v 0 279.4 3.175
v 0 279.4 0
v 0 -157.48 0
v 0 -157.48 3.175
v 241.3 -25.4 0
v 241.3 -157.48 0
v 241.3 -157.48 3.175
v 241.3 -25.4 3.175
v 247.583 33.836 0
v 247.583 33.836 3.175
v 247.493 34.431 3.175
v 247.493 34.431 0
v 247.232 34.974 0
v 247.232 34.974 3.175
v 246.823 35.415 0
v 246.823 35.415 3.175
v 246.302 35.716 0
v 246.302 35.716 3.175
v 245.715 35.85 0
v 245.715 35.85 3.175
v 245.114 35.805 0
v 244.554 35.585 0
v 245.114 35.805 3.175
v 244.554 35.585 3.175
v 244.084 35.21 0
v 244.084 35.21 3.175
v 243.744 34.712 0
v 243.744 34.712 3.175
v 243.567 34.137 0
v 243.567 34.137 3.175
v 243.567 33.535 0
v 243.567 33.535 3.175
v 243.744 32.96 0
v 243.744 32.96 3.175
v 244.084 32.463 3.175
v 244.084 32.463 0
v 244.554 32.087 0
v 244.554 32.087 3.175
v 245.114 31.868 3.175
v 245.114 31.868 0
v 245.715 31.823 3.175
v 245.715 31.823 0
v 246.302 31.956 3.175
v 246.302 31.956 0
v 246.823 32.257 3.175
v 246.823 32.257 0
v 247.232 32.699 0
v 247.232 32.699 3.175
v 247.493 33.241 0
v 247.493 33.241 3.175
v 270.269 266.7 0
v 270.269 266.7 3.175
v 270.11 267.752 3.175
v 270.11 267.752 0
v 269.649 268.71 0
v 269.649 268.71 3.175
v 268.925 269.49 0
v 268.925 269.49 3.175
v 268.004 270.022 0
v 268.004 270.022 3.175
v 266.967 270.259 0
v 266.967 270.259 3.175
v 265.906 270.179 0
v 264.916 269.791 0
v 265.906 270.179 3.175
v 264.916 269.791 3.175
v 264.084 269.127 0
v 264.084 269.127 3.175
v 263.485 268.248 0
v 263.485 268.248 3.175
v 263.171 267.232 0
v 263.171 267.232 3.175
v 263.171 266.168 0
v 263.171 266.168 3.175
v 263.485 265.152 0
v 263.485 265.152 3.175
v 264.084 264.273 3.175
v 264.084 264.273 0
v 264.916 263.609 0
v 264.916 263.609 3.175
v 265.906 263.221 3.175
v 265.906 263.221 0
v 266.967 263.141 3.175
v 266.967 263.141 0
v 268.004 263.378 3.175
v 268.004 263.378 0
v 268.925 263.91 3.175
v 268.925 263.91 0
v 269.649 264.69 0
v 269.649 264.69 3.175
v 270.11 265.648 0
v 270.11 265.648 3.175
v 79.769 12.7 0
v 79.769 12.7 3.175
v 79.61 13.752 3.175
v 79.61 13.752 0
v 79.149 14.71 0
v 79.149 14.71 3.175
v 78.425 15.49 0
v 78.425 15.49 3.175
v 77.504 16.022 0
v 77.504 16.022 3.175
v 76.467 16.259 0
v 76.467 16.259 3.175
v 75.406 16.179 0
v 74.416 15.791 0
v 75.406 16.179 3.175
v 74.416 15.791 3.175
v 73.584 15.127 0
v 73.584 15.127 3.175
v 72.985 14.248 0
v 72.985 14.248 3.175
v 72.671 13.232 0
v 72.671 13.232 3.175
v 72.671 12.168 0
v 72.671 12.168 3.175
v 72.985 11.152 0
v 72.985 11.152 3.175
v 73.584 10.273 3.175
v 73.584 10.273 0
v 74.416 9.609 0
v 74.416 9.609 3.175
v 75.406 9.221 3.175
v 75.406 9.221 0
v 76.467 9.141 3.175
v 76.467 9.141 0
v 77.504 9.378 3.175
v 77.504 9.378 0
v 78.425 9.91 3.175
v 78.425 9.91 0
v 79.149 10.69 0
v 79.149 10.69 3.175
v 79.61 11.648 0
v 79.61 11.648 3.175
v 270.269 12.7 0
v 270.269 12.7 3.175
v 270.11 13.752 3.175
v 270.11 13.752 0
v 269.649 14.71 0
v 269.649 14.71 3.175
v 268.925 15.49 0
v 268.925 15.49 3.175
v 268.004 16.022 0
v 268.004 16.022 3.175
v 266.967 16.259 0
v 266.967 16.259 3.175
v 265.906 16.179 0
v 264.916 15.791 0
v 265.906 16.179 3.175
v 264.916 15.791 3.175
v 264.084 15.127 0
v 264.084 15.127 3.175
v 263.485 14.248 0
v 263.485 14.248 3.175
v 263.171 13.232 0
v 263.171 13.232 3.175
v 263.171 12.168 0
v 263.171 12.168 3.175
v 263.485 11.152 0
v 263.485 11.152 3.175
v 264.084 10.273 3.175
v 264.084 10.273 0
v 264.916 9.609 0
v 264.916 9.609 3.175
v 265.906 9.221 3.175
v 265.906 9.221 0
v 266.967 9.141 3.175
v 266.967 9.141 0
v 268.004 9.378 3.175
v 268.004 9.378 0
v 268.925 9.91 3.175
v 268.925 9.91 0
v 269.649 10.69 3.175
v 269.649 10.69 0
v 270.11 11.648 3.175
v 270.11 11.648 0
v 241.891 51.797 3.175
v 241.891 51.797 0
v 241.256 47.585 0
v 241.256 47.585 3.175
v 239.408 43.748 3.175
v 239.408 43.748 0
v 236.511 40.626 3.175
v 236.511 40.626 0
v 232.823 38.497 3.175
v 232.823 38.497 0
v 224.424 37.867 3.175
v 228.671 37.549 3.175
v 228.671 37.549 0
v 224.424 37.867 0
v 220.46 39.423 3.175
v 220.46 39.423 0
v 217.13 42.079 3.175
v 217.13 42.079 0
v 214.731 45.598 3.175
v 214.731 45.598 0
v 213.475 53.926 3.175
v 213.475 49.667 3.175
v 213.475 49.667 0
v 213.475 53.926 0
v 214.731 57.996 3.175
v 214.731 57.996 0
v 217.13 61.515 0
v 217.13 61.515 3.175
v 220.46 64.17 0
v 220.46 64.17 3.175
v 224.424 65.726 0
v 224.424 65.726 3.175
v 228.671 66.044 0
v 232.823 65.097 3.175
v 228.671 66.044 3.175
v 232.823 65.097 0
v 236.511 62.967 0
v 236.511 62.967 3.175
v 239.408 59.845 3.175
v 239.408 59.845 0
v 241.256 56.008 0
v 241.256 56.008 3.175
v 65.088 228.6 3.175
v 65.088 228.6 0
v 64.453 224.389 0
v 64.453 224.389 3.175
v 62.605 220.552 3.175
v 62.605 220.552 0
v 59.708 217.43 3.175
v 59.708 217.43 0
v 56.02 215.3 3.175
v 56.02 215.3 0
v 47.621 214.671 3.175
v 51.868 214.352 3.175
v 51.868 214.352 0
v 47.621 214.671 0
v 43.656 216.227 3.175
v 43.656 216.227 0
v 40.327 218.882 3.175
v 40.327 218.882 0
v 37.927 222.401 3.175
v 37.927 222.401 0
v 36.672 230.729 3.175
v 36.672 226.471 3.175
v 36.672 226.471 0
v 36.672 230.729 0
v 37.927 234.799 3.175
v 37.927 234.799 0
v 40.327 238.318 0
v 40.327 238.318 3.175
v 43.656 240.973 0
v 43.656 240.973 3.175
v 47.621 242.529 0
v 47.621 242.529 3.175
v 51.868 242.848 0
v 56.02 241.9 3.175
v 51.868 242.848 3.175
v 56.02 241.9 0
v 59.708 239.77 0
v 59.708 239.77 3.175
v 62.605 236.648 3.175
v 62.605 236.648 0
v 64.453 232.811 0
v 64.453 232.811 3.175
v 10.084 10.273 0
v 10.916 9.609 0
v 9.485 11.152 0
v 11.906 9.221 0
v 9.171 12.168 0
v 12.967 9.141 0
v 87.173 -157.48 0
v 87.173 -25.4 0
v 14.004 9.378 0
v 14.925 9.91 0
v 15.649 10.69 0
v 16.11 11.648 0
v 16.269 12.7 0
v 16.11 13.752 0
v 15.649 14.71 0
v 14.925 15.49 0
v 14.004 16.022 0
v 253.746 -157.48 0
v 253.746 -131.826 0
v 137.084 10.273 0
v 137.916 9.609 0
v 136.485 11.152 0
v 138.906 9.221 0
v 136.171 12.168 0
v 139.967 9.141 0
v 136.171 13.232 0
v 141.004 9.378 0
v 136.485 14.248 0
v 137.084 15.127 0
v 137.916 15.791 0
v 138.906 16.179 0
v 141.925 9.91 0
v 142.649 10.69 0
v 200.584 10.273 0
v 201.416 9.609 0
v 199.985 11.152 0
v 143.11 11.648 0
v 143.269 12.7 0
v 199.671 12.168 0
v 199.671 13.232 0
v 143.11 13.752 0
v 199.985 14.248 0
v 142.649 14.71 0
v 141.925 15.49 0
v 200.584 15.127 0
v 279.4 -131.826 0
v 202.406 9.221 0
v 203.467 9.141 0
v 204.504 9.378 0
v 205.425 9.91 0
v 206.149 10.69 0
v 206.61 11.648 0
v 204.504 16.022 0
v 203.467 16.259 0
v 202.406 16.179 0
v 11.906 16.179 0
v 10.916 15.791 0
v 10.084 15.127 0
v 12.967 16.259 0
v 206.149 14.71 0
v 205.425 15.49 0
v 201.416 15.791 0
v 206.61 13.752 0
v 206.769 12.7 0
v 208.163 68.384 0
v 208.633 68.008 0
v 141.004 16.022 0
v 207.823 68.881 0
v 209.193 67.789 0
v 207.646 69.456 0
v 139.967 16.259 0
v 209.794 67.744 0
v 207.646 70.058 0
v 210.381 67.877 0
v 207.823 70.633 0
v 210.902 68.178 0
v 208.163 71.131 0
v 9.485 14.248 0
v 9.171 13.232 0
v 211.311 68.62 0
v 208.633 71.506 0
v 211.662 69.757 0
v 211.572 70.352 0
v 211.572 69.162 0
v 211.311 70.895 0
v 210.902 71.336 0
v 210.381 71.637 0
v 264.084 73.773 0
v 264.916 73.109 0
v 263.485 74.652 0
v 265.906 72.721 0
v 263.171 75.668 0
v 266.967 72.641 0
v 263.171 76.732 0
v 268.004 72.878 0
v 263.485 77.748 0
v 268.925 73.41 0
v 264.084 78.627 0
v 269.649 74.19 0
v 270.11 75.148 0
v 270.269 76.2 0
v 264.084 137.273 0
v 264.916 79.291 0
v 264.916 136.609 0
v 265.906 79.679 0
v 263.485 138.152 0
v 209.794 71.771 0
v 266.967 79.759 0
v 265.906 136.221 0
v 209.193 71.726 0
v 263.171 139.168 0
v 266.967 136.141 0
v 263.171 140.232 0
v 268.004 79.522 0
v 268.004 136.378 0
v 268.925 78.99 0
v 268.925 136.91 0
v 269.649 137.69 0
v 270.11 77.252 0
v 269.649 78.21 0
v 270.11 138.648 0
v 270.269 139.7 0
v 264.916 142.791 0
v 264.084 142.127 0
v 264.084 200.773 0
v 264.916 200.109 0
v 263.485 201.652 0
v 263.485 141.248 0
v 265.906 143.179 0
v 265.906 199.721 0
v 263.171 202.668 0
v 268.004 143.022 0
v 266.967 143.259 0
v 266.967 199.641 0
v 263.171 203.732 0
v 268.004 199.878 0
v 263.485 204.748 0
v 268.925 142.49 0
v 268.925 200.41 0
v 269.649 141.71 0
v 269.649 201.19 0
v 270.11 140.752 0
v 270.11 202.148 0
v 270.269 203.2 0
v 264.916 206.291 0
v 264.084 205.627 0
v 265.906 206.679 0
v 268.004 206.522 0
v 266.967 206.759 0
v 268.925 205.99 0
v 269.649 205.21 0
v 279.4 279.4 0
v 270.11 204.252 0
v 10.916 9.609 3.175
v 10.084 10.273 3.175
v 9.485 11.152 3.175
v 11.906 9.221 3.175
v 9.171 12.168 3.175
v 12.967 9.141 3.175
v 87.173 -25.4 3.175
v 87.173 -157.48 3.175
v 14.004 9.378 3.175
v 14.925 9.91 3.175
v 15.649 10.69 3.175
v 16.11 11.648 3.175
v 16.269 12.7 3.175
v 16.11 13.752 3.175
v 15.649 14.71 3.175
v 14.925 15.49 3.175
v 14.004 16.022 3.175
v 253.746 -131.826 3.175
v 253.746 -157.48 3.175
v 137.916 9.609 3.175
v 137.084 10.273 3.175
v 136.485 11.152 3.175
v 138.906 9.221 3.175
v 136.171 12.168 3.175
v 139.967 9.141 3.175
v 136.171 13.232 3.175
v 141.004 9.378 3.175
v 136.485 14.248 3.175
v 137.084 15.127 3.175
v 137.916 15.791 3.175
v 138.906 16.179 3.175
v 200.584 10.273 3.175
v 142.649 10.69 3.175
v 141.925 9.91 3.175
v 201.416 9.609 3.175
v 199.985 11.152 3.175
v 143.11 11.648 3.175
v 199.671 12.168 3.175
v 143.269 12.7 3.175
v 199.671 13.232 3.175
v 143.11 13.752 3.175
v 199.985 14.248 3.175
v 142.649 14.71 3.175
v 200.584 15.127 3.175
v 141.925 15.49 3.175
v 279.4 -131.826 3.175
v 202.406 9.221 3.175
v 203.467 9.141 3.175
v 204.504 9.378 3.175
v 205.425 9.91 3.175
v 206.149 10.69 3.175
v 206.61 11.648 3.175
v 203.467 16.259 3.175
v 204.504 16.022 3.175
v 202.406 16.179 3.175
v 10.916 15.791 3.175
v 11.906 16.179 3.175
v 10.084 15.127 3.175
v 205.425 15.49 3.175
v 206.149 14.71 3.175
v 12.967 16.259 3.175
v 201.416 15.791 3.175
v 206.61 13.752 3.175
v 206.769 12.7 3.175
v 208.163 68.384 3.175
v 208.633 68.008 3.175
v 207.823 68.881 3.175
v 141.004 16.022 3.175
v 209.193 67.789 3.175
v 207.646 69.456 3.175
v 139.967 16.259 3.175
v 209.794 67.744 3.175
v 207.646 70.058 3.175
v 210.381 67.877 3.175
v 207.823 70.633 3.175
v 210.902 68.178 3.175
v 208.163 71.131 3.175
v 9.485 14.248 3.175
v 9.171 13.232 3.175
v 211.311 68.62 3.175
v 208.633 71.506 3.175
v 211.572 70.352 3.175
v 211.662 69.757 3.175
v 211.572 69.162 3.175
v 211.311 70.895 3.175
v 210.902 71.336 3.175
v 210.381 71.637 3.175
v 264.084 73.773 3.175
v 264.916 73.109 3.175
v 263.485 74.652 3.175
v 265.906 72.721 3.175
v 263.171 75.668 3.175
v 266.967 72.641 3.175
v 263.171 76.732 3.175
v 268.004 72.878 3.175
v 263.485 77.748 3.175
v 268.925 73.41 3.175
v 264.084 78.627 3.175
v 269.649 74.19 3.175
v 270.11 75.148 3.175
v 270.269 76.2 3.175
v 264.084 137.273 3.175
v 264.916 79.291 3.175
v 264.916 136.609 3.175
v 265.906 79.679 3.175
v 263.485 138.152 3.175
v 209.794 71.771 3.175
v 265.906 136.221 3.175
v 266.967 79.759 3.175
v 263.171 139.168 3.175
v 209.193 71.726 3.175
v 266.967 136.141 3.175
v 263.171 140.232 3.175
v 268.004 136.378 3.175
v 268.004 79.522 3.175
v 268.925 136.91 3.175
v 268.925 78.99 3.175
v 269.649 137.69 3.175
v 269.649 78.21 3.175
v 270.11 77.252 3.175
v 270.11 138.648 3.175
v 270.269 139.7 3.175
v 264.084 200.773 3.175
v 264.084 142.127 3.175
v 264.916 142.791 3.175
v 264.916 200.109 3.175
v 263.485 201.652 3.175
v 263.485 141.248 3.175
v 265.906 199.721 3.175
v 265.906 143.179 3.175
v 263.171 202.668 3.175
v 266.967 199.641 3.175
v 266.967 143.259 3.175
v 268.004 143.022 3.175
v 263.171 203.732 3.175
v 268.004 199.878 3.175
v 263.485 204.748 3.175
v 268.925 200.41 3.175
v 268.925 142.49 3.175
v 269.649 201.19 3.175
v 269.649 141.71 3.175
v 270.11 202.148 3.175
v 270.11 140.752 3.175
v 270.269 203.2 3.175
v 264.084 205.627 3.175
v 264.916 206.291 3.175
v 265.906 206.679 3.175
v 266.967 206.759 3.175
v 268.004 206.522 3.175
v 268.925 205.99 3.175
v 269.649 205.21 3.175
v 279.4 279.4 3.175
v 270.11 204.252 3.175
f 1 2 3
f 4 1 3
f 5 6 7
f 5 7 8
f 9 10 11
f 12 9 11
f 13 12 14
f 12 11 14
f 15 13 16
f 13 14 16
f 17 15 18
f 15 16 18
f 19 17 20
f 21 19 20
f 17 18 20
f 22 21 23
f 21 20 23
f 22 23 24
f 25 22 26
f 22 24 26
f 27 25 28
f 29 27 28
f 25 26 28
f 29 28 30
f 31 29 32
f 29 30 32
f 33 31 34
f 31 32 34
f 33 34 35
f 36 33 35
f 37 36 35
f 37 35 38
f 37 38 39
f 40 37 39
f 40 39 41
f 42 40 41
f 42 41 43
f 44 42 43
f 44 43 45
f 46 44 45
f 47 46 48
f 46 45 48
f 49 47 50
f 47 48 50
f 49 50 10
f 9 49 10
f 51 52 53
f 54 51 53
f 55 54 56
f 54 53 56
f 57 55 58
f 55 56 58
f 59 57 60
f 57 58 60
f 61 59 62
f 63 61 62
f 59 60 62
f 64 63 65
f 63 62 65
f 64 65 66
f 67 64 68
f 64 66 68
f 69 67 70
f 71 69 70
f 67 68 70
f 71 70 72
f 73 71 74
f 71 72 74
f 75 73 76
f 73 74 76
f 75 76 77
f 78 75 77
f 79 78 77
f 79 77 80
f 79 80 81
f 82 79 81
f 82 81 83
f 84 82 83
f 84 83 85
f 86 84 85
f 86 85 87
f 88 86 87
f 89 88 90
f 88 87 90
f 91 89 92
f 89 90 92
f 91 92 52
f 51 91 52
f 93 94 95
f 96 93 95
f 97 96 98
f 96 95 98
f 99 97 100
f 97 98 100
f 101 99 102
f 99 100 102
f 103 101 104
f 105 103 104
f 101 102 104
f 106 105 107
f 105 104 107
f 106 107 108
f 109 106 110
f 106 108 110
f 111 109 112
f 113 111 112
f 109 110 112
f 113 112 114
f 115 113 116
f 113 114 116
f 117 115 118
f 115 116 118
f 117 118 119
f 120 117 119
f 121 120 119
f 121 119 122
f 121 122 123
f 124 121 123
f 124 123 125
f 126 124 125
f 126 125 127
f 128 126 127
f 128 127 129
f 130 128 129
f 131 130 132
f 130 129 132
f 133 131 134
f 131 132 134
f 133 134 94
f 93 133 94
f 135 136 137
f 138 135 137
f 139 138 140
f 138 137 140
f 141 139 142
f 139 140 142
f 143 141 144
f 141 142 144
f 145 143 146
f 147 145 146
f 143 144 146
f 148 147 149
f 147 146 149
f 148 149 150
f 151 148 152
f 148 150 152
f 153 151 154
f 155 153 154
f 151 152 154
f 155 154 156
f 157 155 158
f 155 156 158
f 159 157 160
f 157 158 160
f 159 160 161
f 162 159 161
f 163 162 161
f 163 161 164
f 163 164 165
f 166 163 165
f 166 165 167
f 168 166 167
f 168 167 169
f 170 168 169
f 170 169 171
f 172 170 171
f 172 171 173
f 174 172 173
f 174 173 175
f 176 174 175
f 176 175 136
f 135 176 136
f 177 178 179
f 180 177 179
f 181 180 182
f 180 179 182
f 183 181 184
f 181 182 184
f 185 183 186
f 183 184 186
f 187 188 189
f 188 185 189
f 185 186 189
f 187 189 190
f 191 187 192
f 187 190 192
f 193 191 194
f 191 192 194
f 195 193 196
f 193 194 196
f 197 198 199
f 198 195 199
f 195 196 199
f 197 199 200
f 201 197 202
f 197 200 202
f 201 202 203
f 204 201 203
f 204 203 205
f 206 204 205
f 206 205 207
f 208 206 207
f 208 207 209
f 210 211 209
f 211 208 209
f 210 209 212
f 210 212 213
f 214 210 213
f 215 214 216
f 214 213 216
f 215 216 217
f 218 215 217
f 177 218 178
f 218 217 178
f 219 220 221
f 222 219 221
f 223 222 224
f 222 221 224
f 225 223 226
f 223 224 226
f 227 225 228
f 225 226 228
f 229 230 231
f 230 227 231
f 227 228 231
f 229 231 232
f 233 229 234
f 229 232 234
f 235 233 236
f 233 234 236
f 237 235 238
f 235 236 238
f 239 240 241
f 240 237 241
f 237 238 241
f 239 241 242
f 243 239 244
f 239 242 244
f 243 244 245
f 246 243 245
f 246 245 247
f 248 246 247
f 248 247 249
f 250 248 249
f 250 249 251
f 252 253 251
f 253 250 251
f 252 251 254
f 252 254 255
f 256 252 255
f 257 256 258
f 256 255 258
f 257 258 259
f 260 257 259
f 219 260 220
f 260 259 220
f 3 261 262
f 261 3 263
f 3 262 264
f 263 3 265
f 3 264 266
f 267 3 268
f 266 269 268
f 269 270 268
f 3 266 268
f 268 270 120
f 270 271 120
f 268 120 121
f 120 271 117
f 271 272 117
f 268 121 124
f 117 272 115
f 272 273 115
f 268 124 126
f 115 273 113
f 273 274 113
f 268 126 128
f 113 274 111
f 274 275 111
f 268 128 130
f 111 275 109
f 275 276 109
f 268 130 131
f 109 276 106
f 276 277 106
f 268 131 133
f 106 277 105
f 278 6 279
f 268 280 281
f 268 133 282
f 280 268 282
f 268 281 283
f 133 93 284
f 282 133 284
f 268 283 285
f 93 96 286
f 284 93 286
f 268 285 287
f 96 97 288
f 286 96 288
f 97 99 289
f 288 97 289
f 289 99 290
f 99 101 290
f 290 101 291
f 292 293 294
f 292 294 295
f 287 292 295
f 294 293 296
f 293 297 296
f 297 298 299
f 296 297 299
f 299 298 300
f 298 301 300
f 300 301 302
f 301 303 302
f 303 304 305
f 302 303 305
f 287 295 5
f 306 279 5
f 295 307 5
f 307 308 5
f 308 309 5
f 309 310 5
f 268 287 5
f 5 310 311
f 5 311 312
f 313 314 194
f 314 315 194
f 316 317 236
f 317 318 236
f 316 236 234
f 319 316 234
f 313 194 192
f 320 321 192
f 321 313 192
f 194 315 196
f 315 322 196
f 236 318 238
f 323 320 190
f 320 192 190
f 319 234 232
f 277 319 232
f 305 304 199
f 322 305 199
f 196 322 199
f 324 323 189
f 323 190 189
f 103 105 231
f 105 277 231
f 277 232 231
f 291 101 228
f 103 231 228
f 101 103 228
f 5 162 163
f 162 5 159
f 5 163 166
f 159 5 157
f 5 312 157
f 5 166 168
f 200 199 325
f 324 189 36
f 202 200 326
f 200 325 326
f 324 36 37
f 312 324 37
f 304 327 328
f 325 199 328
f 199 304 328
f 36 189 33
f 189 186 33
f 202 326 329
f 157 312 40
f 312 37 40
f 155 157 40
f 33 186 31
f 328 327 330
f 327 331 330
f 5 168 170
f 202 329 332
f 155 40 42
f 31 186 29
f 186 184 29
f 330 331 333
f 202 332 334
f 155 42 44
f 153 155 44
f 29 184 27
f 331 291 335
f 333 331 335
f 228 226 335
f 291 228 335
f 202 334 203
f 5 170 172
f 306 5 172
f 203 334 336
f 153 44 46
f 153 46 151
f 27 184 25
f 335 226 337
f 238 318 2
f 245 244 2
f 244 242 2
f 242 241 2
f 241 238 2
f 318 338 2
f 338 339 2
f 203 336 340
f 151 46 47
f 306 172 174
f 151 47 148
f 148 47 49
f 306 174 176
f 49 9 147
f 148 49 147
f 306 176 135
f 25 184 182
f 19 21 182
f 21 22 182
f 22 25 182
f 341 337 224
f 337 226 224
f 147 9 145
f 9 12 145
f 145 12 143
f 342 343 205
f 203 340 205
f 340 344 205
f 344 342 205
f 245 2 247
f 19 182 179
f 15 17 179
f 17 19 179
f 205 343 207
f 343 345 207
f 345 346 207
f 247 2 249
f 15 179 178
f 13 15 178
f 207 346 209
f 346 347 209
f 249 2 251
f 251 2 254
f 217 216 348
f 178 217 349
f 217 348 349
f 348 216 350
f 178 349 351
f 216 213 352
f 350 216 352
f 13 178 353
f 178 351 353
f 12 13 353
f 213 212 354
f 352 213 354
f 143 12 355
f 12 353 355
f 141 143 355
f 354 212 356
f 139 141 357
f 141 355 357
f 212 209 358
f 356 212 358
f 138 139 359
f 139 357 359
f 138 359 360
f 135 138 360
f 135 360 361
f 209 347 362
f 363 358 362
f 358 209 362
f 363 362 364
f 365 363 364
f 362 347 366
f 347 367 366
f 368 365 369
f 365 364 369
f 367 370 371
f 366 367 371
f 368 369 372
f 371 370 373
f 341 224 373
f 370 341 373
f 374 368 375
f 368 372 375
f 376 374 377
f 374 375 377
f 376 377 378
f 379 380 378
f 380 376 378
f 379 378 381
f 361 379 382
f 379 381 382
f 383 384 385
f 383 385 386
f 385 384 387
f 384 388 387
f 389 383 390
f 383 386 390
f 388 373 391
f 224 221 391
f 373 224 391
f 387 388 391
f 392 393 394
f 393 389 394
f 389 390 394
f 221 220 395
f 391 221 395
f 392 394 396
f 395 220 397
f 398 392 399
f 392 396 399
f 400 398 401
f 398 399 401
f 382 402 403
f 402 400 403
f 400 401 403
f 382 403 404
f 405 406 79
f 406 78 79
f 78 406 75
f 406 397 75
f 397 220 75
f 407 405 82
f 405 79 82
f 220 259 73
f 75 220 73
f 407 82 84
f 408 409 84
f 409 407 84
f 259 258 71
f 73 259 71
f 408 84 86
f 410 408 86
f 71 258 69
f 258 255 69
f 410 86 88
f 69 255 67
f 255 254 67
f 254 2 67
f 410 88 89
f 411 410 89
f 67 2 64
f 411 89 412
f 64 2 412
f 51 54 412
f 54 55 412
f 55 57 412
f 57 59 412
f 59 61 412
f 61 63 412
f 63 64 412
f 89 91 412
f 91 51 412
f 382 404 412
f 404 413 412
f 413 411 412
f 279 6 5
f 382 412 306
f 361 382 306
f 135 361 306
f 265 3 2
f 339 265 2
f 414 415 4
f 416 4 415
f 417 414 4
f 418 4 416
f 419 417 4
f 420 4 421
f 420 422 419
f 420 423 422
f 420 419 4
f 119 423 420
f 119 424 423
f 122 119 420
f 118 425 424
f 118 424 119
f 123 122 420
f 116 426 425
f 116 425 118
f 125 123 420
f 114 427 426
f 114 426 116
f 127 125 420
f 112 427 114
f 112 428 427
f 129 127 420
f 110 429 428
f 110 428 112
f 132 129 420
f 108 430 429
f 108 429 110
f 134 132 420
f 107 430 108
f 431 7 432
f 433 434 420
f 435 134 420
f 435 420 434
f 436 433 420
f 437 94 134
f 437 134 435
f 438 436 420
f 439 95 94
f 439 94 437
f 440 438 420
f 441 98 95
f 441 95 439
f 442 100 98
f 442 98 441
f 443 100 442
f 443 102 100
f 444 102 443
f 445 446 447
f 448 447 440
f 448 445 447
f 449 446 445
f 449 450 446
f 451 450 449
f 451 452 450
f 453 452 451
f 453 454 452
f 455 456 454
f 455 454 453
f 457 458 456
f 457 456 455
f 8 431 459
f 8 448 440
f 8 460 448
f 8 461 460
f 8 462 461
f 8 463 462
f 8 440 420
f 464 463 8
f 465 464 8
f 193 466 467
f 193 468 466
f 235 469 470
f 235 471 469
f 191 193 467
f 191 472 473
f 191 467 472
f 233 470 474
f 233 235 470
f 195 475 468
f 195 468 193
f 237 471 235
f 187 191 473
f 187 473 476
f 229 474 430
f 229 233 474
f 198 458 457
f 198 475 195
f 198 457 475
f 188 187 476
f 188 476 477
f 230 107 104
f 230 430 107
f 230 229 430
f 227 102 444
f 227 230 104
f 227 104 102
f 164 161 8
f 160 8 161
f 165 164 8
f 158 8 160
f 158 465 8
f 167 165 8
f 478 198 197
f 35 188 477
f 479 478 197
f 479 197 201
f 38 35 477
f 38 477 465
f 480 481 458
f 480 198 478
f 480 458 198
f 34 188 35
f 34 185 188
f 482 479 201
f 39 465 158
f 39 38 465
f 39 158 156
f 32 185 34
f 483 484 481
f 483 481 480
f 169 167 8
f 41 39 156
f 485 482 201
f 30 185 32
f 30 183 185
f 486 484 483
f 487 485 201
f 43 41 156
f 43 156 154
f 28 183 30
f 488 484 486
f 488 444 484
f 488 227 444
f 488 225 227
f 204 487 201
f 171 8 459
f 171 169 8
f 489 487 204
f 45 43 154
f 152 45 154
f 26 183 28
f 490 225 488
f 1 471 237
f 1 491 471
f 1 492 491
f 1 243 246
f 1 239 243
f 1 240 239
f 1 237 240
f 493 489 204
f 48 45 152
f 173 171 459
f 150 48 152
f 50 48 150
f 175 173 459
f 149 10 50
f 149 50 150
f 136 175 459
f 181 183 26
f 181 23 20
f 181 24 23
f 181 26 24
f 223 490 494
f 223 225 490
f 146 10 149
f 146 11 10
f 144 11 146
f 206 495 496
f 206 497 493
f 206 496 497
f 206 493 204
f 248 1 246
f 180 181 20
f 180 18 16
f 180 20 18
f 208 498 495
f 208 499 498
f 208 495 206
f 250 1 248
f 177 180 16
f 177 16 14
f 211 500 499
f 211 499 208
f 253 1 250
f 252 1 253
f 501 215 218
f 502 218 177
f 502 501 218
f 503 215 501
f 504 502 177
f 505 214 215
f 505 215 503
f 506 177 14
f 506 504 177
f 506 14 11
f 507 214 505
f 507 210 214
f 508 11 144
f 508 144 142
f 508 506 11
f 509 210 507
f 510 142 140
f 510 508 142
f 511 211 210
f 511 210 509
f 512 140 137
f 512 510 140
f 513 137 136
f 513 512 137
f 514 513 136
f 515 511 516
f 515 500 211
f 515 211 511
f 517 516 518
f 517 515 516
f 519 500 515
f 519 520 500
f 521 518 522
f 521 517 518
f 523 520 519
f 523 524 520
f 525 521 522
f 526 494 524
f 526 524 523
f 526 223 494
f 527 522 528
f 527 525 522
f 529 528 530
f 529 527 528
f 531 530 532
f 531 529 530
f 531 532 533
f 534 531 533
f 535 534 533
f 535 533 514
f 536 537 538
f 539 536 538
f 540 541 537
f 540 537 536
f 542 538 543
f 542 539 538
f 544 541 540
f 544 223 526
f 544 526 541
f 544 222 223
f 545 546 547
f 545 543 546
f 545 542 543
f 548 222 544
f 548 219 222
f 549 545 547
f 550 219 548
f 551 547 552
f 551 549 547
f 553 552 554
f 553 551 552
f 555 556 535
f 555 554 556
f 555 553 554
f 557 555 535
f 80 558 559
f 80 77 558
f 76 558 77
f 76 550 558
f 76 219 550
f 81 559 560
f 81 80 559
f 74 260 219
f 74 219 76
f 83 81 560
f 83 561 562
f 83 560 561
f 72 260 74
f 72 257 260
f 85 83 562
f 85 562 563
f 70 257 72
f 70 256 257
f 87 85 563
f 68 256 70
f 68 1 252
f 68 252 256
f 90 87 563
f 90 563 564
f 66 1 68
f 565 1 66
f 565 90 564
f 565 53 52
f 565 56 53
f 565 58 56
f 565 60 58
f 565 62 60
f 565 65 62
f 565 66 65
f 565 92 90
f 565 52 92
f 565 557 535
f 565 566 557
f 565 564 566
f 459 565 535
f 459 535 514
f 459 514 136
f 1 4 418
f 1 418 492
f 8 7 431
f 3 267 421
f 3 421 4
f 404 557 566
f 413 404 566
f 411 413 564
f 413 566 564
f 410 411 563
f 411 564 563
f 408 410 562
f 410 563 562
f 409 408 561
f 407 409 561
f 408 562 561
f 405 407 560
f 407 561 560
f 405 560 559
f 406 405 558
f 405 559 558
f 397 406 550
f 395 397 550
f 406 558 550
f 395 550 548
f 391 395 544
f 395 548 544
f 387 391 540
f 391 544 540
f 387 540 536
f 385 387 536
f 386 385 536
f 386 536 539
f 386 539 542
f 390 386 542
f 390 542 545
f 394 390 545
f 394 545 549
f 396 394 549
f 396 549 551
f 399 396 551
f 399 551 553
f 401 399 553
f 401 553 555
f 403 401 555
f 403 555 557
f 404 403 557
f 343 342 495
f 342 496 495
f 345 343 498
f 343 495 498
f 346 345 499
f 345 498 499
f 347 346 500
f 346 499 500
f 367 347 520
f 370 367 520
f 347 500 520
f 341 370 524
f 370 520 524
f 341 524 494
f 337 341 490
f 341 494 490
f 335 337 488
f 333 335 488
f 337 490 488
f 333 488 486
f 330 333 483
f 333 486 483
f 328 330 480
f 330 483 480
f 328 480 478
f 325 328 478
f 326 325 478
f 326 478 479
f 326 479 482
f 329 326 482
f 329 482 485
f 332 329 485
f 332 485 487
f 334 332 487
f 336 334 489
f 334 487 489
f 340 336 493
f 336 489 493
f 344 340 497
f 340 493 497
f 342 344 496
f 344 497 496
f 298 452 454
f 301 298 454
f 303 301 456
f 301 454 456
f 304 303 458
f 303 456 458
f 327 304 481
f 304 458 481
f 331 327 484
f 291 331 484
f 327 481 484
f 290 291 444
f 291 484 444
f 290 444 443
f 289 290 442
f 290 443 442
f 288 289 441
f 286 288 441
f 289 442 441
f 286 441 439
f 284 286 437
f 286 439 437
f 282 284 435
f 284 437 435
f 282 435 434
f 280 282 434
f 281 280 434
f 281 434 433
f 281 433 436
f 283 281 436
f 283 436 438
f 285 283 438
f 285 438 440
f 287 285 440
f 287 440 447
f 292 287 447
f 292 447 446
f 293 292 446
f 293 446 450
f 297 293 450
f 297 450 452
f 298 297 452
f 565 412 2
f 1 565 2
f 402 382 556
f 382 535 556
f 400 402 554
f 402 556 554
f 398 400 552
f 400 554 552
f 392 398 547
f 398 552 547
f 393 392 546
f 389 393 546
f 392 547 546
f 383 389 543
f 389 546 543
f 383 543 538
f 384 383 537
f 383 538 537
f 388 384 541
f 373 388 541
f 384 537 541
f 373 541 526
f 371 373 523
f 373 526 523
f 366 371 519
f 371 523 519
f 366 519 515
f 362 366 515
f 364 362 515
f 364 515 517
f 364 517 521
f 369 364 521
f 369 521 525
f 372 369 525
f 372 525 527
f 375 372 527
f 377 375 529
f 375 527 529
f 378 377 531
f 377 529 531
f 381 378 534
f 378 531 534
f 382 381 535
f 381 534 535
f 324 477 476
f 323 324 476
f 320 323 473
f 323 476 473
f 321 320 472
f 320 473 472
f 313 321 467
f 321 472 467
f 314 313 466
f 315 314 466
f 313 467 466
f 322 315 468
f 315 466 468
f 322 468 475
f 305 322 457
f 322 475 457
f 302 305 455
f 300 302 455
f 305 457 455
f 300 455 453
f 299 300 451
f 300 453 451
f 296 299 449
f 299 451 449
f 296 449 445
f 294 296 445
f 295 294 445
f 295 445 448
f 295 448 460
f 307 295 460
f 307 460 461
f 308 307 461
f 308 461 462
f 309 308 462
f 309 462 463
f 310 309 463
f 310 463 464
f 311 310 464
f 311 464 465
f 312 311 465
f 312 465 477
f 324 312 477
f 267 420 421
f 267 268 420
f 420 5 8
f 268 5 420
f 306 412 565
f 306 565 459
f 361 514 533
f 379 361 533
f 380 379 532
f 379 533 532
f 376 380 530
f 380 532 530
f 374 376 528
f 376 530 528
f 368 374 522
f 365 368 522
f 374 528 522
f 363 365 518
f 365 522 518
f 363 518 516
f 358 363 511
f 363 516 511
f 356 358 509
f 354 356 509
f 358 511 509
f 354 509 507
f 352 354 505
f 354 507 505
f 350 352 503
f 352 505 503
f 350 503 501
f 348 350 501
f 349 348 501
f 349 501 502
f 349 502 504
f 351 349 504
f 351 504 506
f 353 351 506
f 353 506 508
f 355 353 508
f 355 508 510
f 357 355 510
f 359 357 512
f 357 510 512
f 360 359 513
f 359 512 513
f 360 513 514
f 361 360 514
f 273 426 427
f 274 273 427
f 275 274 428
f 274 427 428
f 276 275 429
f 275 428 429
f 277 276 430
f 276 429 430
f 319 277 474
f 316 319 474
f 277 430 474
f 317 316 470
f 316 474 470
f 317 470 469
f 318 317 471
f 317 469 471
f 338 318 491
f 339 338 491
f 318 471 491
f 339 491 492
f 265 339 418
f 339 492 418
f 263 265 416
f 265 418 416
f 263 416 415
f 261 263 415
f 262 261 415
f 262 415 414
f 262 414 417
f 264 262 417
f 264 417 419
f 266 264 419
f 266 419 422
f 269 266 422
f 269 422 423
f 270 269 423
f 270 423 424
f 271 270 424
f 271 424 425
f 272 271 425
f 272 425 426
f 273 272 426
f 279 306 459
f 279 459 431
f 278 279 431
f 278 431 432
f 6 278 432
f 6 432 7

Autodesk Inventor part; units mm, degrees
ref_plane "YZ Plane" through (0, 0, 0) normal (1, 0, 0) x (0, 1, 0)
ref_plane "XZ Plane" through (0, 0, 0) normal (0, 1, 0) x (-1, 0, 0)
ref_plane "XY Plane" through (0, 0, 0) normal (0, 0, 1) x (1, 0, 0)
sketch "Sketch1" plane through (0, 0, 0) normal (0, 0, 1) x (1, 0, 0)
  line L0 (279.4, 279.4) -> (0, 279.4)
  line L1 (0, 279.4) -> (0, 0)
  circle A0 centre (50.8, 228.6) radius 14.2875
  circle A1 centre (50.8, 228.6) radius 250.0376 construction
  circle A2 centre (227.6033, 51.7967) radius 14.2875
  line L2 (50.8, 228.6) -> (279.4, 0) construction
  line L3 (279.4, 279.4) -> (279.4, -131.826)
  line L4 (279.4, -131.826) -> (253.746, -131.826)
  line L5 (253.746, -131.826) -> (253.746, -157.48)
  line L6 (253.746, -157.48) -> (241.3, -157.48)
  line L7 (241.3, -157.48) -> (241.3, -25.4)
  line L8 (241.3, -25.4) -> (87.1728, -25.4)
  line L9 (87.1728, -25.4) -> (87.1728, -157.48)
  line L10 (87.1728, -157.48) -> (0, -157.48)
  line L11 (0, -157.48) -> (0, 0)
  dimension "d5" = 500.0752
  dimension "d0" = 279.4
  dimension "d1" = 279.4
  dimension "d2" = 28.575
  dimension "d6" = 28.575
  dimension "d36" = 411.226
  dimension "d37" = 25.654
  dimension "d38" = 25.654
  dimension "d39" = 12.446
  dimension "d40" = 132.08
  dimension "d41" = 154.1272
extrude "Extrusion1" add sketch "Sketch1" along normal blind 3.175
sketch "Sketch2" plane through (0, 0, 3.175) normal (0, 0, 1) x (1, 0, 0)
  circle A0 centre (266.7, 12.7) radius 3.5687
  line L0 (0, 0) -> (279.4, 0) projected
  line L1 (279.4, 0) -> (279.4, 279.4) projected
  circle A1 centre (266.7, 76.2) radius 3.5687
  circle A2 centre (266.7, 139.7) radius 3.5687
  circle A3 centre (266.7, 203.2) radius 3.5687
  circle A4 centre (266.7, 266.7) radius 3.5687
  circle A5 centre (203.2, 12.7) radius 3.5687
  circle A6 centre (139.7, 12.7) radius 3.5687
  circle A7 centre (76.2, 12.7) radius 3.5687
  circle A8 centre (12.7, 12.7) radius 3.5687
  dimension "d9" = 7.1374
  dimension "d10" = 12.7
  dimension "d11" = 12.7
  dimension "d14" = 63.5
  dimension "d24" = 63.5
extrude "Extrusion2" cut sketch "Sketch2" against normal blind 3.175
sketch "Sketch3" plane through (0, 0, 3.175) normal (0, 0, 1) x (1, 0, 0)
  circle A0 centre (227.6033, 51.7967) radius 14.195
  circle A1 centre (209.6428, 69.7572) radius 2.0193
  circle A2 centre (245.5638, 33.8362) radius 2.0193
  line L0 (206.6033, 58.9967) -> (206.6033, 44.5967)
  line L1 (206.6033, 44.5967) -> (205.3783, 43.3717)
  line L2 (205.3783, 43.3717) -> (205.3783, 37.7967)
  line L3 (205.3783, 37.7967) -> (211.6033, 37.7967)
  arc A3 (213.6033, 35.7967) -> (211.6033, 37.7967) centre (211.6033, 35.7967) ccw
  line L4 (213.6033, 35.7967) -> (213.6033, 30.7967)
  line L5 (213.6033, 30.7967) -> (247.6033, 30.7967)
  arc A4 (247.6033, 30.7967) -> (248.6033, 31.7967) centre (227.6033, 51.7967) ccw
  line L6 (248.6033, 31.7967) -> (248.6033, 33.5967)
  line L7 (248.6033, 33.5967) -> (249.8283, 34.8217)
  line L8 (249.8283, 34.8217) -> (249.8283, 43.3717)
  line L9 (249.8283, 43.3717) -> (248.6033, 44.5967)
  line L10 (248.6033, 44.5967) -> (248.6033, 58.9967)
  line L11 (248.6033, 58.9967) -> (249.8283, 60.2217)
  line L12 (249.8283, 60.2217) -> (249.8283, 65.7967)
  line L13 (249.8283, 65.7967) -> (243.6033, 65.7967)
  arc A5 (241.6033, 67.7967) -> (243.6033, 65.7967) centre (243.6033, 67.7967) ccw
  line L14 (241.6033, 67.7967) -> (241.6033, 72.7967)
  line L15 (241.6033, 72.7967) -> (207.6033, 72.7967)
  arc A6 (207.6033, 72.7967) -> (206.6033, 71.7967) centre (227.6033, 51.7967) ccw
  line L16 (206.6033, 71.7967) -> (206.6033, 69.9967)
  line L17 (206.6033, 69.9967) -> (205.3783, 68.7717)
  line L18 (205.3783, 68.7717) -> (205.3783, 60.2217)
  line L19 (205.3783, 60.2217) -> (206.6033, 58.9967)
  circle A7 centre (227.6033, 51.7967) radius 14.2875 projected
  point P0 (0, 0)
  dimension "d28" = 3.0395
  dimension "d29" = 4.2645
  dimension "d30" = 21
  dimension "d31" = 21
  dimension "d32" = 3.0395
  dimension "d33" = 4.2645
extrude "Extrusion3" cut sketch "Sketch3" against normal blind 25.4 contours A1 | A2
properties part number "1073-2017 Shooter Outside Plate Right"
